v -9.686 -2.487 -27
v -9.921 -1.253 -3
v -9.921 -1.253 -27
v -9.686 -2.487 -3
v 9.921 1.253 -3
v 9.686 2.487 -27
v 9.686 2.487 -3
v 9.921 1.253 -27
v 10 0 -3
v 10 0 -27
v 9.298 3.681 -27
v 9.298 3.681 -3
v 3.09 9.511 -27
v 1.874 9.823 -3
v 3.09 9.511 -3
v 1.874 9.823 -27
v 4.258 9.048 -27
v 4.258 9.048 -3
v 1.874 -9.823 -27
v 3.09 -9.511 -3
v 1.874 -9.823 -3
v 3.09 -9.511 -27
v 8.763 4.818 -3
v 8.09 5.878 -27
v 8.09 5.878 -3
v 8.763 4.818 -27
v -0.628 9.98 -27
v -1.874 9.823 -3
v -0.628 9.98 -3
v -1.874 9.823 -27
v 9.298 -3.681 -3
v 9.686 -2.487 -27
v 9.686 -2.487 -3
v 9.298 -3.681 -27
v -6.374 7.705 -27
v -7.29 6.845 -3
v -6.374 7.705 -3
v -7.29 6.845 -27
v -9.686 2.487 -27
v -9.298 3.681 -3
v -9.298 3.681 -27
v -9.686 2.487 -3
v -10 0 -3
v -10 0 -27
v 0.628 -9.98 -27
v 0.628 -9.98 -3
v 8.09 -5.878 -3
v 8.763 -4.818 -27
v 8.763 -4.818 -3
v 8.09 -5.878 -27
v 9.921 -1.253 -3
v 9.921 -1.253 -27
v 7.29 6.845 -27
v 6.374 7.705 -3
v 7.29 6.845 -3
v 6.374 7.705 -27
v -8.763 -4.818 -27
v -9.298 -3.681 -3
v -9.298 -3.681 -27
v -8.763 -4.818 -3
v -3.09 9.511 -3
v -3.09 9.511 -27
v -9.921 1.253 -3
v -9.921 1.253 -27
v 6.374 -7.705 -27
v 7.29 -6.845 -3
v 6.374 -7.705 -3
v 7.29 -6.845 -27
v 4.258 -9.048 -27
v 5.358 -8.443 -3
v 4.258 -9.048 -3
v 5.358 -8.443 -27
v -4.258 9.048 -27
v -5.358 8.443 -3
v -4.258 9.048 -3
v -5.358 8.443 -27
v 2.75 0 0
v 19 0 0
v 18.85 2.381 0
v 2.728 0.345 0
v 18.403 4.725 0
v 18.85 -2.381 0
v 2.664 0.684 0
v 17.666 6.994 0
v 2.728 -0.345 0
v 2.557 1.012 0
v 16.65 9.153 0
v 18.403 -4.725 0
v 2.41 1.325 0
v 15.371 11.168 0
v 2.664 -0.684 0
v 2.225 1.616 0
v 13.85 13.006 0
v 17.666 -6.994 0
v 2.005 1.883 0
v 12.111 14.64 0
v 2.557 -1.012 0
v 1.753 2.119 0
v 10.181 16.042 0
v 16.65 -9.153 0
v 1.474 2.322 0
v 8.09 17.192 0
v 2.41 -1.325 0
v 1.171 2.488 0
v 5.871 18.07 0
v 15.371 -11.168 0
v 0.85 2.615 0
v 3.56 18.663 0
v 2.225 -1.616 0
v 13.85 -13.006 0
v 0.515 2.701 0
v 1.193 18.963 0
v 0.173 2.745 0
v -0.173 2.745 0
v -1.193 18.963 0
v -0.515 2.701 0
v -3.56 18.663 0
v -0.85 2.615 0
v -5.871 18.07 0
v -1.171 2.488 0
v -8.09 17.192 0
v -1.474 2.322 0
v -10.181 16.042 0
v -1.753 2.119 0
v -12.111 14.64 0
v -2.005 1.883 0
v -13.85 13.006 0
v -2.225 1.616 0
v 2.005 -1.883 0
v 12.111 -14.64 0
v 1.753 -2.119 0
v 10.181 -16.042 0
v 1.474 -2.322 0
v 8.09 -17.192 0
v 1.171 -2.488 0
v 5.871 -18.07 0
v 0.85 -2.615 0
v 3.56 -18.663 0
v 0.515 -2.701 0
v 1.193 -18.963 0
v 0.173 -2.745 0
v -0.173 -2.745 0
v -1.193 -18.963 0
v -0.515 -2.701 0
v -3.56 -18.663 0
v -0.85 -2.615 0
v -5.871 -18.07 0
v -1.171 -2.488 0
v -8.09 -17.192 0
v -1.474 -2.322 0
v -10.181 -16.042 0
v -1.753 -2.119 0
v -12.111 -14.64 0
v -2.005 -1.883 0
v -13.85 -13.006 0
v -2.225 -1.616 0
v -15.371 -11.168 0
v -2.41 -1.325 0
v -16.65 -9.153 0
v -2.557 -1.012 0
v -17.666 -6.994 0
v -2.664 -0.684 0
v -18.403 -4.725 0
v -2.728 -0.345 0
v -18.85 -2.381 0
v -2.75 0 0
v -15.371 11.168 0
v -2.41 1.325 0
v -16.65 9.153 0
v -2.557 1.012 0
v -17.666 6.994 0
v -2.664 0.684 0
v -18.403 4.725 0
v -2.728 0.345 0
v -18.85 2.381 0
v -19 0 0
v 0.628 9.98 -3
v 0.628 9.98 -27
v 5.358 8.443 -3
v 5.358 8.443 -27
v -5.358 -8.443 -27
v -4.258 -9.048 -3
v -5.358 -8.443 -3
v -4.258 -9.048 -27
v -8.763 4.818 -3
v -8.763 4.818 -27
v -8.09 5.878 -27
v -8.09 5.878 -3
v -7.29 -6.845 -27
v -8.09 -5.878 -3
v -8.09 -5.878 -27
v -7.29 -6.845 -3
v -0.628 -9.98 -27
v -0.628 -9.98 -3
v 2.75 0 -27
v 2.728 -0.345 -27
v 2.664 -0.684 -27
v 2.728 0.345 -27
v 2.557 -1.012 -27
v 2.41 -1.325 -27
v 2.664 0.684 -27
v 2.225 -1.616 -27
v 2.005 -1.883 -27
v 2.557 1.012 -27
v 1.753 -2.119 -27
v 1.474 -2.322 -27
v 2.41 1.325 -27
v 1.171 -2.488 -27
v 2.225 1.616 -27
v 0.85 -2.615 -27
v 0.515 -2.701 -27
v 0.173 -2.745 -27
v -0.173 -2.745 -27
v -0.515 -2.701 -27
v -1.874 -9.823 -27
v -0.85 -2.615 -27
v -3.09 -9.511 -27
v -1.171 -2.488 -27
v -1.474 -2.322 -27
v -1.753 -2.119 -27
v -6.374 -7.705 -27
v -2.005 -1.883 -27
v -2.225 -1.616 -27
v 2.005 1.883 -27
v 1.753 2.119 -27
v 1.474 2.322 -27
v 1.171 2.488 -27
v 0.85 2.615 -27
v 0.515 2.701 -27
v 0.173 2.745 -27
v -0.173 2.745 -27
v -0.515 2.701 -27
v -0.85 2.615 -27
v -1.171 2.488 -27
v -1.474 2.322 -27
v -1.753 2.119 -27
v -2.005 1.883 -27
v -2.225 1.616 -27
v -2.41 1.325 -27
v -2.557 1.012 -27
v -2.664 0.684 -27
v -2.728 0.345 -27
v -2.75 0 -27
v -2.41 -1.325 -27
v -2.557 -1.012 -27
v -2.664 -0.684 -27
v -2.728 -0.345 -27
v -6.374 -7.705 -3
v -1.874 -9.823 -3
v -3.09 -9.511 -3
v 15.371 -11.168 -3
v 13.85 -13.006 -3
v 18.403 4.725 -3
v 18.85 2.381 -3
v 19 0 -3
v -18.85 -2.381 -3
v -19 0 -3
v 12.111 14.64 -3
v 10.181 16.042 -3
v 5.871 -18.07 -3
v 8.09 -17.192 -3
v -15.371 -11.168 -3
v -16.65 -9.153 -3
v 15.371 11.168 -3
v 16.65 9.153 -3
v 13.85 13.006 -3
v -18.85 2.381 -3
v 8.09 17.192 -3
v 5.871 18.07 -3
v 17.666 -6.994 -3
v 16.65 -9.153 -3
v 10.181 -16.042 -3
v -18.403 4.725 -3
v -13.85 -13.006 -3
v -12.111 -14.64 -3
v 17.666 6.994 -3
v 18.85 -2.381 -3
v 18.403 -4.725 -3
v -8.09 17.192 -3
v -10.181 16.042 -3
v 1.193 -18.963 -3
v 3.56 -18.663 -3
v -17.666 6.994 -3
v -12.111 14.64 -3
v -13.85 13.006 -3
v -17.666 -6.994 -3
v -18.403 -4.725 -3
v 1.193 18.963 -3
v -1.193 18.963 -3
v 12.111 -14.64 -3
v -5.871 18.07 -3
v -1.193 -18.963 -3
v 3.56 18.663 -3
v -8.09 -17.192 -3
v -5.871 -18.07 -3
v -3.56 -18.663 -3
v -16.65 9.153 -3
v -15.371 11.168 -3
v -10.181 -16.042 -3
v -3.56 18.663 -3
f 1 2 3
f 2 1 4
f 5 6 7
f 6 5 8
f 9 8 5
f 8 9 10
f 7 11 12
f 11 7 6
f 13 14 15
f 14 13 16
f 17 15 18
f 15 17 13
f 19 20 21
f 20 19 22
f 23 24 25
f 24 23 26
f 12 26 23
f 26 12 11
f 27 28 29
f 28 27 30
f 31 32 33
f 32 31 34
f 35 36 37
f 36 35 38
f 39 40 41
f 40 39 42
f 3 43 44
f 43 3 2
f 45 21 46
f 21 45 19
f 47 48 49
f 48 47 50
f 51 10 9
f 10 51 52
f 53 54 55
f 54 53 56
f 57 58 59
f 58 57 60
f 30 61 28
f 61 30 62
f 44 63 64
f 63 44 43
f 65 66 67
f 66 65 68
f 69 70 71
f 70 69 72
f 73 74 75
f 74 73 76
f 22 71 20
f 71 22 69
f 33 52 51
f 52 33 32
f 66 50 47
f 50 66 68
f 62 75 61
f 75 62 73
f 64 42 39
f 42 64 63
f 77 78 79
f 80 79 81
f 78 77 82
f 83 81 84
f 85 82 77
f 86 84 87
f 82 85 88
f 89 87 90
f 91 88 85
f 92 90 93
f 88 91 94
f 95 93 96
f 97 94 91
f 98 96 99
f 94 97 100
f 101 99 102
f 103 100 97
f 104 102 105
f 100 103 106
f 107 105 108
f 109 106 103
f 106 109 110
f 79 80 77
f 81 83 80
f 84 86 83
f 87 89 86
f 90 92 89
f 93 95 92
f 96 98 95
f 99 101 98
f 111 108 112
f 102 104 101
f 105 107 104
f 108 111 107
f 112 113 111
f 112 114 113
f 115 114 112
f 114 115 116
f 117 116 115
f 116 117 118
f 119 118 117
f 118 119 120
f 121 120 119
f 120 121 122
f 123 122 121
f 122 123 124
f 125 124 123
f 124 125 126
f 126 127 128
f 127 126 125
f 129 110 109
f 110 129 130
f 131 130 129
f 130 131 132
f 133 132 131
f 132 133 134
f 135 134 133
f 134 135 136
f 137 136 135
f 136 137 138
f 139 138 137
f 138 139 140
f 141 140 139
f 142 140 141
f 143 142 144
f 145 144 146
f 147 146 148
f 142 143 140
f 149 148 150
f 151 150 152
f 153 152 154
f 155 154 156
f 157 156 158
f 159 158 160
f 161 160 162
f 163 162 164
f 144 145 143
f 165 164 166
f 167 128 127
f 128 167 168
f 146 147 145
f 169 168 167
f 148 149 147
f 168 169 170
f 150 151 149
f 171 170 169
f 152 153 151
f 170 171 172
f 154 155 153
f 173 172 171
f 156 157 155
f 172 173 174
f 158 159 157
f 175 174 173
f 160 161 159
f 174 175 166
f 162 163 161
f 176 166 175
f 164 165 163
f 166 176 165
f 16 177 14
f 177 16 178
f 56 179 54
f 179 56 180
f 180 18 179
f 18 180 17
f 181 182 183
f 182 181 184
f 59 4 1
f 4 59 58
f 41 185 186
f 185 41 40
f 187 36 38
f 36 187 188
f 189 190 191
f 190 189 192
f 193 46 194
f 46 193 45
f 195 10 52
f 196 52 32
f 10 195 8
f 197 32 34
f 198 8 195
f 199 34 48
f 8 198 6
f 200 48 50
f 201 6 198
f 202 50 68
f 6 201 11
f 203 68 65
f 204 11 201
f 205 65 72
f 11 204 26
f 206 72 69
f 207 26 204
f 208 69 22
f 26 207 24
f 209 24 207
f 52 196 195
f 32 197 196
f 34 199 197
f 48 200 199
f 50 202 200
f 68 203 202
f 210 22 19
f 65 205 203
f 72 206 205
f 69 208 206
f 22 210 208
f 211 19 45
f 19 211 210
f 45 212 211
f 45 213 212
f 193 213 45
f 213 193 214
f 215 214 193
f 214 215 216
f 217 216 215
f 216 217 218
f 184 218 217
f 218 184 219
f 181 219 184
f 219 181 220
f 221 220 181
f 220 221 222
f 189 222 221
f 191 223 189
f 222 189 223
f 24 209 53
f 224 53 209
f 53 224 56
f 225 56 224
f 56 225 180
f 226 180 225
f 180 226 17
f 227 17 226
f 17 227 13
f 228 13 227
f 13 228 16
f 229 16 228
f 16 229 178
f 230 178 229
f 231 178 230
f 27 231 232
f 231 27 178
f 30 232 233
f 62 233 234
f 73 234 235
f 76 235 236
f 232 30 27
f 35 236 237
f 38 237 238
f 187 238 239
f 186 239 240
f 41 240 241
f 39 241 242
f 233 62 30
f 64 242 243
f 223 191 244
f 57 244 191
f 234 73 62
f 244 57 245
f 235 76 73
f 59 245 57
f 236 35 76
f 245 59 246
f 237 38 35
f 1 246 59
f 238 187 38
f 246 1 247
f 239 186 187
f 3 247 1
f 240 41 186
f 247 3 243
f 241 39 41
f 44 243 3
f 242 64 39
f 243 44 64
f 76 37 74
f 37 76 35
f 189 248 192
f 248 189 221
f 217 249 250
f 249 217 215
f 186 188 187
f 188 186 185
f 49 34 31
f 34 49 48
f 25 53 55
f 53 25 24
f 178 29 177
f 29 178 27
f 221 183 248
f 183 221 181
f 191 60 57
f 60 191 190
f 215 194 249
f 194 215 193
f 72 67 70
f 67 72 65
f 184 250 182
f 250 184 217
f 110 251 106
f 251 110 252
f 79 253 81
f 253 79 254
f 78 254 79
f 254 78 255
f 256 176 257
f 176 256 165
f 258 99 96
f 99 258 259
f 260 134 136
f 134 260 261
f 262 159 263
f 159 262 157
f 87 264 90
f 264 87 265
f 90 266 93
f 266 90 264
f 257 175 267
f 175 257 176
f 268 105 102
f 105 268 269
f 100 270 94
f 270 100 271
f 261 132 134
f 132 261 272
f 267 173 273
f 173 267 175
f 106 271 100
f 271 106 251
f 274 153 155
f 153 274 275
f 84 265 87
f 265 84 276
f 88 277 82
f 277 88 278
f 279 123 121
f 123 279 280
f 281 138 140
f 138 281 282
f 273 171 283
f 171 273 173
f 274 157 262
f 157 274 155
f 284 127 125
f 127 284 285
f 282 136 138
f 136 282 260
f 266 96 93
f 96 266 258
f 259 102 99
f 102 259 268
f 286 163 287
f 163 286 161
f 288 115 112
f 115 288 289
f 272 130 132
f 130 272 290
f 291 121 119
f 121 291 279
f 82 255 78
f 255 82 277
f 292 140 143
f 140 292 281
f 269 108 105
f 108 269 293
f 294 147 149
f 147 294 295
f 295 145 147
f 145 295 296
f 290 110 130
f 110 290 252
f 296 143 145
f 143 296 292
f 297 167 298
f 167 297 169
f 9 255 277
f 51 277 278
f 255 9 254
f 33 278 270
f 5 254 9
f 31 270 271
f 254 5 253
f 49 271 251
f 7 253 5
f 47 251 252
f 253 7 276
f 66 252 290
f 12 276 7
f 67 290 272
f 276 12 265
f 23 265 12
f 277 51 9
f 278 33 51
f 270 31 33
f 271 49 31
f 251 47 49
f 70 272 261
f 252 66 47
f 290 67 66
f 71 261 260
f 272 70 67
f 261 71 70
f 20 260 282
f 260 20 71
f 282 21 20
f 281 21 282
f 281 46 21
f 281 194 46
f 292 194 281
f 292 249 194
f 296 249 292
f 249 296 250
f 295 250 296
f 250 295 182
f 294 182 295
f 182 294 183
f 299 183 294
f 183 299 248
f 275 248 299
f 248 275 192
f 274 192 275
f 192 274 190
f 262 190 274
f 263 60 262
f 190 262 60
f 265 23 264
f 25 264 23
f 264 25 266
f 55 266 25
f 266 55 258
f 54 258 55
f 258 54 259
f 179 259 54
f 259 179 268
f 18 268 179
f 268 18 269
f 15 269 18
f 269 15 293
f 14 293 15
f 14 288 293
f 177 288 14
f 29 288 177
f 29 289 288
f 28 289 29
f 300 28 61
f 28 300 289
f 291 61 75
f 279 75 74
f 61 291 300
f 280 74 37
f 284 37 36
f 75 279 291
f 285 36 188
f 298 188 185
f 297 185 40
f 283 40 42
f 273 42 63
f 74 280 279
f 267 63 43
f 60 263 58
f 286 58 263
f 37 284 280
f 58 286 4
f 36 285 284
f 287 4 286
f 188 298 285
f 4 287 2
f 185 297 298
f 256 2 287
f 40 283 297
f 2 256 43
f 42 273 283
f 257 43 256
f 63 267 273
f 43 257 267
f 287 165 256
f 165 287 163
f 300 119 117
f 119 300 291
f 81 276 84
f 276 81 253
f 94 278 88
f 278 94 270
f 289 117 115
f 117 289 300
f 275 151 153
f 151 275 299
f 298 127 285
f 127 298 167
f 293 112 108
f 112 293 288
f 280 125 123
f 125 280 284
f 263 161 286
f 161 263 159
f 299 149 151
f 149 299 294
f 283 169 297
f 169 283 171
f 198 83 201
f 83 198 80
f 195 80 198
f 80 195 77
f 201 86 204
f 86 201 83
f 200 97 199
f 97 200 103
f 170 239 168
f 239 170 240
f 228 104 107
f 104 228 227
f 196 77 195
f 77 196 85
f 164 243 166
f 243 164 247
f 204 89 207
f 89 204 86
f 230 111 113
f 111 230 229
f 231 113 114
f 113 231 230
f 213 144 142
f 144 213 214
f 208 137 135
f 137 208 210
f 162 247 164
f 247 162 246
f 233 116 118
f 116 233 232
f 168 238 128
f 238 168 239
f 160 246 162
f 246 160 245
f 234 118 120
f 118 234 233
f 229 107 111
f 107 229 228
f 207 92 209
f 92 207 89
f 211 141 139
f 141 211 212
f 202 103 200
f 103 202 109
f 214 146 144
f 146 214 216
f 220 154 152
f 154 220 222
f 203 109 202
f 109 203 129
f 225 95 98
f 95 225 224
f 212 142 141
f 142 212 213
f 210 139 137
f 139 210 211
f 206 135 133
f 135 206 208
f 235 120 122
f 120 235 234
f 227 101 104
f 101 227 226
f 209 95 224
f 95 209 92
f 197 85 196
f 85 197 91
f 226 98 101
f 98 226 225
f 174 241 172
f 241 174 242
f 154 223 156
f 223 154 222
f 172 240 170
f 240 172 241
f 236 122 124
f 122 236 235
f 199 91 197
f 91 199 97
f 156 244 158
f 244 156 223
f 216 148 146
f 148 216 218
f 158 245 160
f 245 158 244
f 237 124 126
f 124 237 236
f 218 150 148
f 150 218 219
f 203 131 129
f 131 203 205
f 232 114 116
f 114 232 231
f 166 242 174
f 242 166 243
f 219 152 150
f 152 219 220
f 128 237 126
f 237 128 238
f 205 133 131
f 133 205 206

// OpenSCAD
$fn = 50;


difference() {
	union() {
		translate(v = [0, 0, -27.0000000000]) {
			cylinder(h = 27, r = 10.0000000000);
		}
		translate(v = [0, 0, -3.0000000000]) {
			cylinder(h = 3, r = 19.0000000000);
		}
	}
	union() {
		#translate(v = [0, 0, -27]) {
			cylinder(h = 27, r = 2.7500000000);
		}
	}
}
